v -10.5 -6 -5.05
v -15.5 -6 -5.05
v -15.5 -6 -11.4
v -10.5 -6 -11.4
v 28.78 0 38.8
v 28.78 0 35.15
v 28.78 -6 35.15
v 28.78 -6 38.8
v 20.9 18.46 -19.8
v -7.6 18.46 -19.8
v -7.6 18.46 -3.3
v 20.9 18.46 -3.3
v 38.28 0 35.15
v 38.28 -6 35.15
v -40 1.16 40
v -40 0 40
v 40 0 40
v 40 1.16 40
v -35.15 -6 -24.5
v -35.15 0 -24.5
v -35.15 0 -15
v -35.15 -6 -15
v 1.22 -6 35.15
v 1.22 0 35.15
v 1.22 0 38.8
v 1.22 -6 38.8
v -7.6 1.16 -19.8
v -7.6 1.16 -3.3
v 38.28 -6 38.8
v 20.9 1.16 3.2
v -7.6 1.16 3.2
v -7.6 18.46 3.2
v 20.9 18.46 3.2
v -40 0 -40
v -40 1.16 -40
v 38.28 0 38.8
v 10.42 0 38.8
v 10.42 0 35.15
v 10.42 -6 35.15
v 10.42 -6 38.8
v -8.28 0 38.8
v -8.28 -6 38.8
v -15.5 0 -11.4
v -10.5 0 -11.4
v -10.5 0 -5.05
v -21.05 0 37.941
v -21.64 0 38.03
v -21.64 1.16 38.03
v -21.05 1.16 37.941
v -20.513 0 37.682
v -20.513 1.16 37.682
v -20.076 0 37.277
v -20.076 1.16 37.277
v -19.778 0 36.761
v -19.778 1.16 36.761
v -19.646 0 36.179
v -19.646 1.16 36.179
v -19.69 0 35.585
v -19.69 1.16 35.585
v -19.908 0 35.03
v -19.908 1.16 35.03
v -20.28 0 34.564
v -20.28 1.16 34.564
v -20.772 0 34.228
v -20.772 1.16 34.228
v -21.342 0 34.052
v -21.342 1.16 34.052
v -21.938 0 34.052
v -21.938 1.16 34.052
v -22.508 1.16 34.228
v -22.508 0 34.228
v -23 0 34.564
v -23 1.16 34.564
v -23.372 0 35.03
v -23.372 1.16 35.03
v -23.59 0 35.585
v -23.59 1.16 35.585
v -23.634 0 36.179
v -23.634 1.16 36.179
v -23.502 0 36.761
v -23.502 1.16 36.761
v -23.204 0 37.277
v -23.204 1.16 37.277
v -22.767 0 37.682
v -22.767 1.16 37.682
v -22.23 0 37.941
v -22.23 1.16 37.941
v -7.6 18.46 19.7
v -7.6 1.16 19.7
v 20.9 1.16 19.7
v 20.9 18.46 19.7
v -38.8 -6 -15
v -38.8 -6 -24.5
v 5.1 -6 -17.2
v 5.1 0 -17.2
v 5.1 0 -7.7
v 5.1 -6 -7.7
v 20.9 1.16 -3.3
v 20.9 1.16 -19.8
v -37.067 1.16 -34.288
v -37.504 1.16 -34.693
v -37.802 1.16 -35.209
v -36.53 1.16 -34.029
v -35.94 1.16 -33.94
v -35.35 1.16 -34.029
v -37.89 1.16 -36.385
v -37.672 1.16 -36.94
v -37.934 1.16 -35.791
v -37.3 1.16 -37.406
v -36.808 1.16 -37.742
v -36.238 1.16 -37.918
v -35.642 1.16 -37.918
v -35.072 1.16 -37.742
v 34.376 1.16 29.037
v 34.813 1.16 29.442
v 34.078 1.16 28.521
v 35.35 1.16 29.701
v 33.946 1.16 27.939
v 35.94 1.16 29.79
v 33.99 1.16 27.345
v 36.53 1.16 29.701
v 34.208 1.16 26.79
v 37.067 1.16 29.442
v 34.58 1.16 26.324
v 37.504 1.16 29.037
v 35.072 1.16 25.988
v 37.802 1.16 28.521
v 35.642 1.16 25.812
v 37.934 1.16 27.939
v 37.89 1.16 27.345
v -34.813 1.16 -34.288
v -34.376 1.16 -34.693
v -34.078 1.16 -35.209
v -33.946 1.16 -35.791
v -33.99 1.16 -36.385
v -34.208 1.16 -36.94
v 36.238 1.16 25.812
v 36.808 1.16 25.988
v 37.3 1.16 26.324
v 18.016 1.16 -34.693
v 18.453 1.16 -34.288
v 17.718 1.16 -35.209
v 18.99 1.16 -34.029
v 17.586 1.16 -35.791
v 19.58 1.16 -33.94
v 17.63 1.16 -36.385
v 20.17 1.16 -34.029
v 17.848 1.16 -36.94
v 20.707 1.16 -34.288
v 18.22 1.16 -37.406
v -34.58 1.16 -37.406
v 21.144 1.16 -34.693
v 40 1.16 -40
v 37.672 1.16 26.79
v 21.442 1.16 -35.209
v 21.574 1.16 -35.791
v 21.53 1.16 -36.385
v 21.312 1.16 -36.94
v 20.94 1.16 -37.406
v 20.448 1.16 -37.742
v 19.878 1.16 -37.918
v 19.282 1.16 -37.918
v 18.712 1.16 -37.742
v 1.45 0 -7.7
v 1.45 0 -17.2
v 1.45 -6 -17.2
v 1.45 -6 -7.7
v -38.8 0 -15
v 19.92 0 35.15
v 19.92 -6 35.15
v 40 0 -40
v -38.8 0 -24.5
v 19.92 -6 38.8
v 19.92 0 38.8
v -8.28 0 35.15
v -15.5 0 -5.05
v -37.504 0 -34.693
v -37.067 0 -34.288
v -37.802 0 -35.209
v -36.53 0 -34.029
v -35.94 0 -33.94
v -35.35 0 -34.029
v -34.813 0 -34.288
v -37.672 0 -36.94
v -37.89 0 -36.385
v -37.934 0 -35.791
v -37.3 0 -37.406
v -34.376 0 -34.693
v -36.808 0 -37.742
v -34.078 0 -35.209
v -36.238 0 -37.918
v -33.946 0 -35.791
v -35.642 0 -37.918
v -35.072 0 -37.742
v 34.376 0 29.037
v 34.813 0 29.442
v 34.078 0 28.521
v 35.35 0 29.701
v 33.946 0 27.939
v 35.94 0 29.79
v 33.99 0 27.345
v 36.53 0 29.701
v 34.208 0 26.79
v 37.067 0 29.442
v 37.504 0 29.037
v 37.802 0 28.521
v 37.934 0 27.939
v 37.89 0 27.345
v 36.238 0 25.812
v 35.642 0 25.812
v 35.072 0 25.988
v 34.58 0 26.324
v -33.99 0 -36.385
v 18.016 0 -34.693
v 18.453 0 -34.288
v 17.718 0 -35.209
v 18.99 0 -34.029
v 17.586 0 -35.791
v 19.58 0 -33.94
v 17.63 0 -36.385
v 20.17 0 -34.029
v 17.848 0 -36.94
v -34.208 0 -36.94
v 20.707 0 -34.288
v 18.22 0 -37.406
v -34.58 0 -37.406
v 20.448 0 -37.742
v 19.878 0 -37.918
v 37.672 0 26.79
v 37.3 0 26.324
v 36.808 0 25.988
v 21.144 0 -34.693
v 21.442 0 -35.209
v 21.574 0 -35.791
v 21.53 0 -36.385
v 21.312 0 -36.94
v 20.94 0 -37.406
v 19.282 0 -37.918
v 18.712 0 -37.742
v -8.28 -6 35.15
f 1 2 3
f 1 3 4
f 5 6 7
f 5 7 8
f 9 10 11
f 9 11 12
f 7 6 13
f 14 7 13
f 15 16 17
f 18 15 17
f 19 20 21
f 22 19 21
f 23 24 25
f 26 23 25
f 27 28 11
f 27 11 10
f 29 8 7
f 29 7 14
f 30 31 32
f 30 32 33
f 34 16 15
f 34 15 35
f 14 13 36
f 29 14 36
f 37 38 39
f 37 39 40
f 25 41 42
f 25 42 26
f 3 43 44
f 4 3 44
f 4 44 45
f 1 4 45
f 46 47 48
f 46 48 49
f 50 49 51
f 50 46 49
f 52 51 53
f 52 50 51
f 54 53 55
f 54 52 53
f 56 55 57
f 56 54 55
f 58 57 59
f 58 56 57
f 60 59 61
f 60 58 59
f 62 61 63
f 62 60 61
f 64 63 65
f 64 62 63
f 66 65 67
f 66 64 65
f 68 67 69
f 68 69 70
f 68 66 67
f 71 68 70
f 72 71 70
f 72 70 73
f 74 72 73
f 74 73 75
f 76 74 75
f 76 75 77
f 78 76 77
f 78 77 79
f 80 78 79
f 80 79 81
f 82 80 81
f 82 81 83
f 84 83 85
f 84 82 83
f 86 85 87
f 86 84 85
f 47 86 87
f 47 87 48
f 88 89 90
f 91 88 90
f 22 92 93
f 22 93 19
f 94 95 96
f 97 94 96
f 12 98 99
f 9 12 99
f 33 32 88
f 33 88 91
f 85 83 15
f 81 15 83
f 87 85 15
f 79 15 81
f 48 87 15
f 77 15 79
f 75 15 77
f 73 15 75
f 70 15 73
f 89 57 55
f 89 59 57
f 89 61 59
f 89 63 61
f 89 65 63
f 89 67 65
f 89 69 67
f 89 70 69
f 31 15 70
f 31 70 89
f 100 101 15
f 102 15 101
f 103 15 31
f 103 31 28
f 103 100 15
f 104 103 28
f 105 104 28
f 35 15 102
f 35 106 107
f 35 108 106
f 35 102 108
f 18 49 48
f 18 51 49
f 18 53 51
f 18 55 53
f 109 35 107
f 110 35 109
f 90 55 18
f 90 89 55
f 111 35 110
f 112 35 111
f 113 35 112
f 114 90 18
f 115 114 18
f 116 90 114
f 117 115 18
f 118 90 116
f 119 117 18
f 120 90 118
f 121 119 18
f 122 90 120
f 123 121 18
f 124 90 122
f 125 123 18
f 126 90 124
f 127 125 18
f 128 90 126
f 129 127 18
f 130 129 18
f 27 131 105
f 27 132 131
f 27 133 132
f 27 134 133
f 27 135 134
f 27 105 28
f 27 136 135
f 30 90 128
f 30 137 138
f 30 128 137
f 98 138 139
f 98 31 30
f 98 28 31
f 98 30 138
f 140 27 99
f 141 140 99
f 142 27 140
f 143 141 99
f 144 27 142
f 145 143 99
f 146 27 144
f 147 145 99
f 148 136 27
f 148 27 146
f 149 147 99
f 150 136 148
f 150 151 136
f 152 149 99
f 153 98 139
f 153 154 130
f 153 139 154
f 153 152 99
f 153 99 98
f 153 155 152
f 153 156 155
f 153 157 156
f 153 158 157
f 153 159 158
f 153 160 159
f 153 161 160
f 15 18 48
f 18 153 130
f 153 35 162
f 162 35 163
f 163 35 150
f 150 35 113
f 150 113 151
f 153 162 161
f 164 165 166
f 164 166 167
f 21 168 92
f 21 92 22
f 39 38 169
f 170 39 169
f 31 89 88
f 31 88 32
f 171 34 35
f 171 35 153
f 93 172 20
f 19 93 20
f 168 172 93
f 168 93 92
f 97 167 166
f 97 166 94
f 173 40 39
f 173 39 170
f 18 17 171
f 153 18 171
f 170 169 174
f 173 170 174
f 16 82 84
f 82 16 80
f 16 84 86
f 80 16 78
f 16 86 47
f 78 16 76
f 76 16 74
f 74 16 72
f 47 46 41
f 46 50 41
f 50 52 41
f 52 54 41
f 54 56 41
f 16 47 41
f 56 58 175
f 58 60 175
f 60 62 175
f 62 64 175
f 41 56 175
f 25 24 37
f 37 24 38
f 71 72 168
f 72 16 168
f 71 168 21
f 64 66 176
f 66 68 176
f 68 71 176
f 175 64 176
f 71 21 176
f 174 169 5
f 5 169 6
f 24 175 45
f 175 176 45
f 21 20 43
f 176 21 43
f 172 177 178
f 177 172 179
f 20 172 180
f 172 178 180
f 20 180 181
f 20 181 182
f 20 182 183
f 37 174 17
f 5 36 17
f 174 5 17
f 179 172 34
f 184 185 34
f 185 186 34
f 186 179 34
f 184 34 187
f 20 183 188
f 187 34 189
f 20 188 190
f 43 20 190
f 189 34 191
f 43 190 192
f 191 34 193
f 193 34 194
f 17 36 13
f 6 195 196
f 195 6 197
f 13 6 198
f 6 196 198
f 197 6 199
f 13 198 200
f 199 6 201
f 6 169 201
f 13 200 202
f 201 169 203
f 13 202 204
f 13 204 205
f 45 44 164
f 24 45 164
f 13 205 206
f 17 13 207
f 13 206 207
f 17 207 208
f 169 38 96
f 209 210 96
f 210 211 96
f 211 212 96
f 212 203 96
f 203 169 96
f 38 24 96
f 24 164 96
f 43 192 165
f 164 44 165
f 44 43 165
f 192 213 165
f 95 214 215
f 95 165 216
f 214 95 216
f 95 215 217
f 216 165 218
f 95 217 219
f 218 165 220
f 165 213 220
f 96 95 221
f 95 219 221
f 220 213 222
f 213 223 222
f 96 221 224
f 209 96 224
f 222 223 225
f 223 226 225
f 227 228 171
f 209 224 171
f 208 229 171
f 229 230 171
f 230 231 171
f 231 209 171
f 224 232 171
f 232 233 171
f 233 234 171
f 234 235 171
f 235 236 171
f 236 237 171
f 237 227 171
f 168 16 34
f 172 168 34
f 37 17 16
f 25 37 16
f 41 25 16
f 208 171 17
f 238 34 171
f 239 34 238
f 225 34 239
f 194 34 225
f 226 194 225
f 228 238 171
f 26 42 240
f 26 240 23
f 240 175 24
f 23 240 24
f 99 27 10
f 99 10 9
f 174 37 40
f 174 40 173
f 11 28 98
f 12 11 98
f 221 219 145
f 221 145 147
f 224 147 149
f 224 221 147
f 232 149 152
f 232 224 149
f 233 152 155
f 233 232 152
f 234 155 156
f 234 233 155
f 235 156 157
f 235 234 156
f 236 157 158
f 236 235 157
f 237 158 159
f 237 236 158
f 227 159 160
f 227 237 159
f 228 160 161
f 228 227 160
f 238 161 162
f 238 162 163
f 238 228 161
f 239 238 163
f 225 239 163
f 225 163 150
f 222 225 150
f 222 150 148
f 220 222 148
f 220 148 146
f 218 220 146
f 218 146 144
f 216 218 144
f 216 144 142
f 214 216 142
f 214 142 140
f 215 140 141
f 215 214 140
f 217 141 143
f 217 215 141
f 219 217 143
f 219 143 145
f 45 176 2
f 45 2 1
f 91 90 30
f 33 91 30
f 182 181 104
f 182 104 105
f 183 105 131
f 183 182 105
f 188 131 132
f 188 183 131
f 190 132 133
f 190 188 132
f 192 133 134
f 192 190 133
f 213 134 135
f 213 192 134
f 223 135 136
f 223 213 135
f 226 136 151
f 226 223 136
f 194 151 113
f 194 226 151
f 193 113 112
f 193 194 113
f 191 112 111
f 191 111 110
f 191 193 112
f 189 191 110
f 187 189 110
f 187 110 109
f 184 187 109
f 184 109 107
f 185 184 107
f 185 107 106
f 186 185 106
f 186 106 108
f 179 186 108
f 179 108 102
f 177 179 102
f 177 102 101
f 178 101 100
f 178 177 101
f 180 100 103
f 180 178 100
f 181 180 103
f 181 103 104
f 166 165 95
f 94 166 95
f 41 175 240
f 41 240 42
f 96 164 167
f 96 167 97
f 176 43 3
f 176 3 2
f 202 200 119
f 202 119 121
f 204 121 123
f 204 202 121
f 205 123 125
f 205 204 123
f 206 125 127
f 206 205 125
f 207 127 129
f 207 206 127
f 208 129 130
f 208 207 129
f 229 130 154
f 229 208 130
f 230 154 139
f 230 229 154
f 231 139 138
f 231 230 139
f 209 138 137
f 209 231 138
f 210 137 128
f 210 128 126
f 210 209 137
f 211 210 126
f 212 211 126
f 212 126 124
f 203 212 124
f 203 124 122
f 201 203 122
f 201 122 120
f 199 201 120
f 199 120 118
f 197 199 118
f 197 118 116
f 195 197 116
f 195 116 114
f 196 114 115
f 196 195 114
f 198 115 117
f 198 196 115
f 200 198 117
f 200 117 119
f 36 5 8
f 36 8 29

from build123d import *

# Parameters (mm, degrees)
ESQUISSE1_W        = 80
ESQUISSE1_H        = 80
ESQUISSE1_R        = 2
BOSS_EXTRU_1_DEPTH = 1.16
ESQUISSE2_W        = 28.5
ESQUISSE2_H        = 16.5
BOSS_EXTRU_2_DEPTH = 17.3
ESQUISSE3_W        = 9.5
ESQUISSE3_H        = 3.65
ESQUISSE3_W_2      = 3.65
ESQUISSE3_H_2      = 9.5
ESQUISSE3_W_3      = 5
ESQUISSE3_H_3      = 6.35
BOSS_EXTRU_3_DEPTH = 6


with BuildPart() as part:
    # Esquisse1 → Boss.-Extru.1 (new body)
    with BuildSketch(Plane(origin=(0, 0, 0), x_dir=(1, 0, 0), z_dir=(0, 1, 0))):
        Rectangle(ESQUISSE1_W, ESQUISSE1_H)
        with Locations(Location((-35.94, 35.94, 0), (0, 0, 270))):
            Circle(ESQUISSE1_R, mode=Mode.SUBTRACT)
        with Locations(Location((19.58, 35.94, 0), (0, 0, 270))):
            Circle(ESQUISSE1_R, mode=Mode.SUBTRACT)
        with Locations(Location((35.94, -27.79, 0), (0, 0, 270))):
            Circle(ESQUISSE1_R, mode=Mode.SUBTRACT)
        with Locations(Location((-21.64, -36.03, 0), (0, 0, 270))):
            Circle(ESQUISSE1_R, mode=Mode.SUBTRACT)
    extrude(amount=BOSS_EXTRU_1_DEPTH)

    # Esquisse2 → Boss.-Extru.2 (add)
    with BuildSketch(Plane(origin=(0, 1.16, 0), x_dir=(1, 0, 0), z_dir=(0, 1, 0))):
        with Locations((6.65, 11.55)):
            Rectangle(ESQUISSE2_W, ESQUISSE2_H)
        with Locations((6.65, -11.45)):
            Rectangle(ESQUISSE2_W, ESQUISSE2_H)
    extrude(amount=BOSS_EXTRU_2_DEPTH)

    # Esquisse3 → Boss.-Extru.3 (add)
    with BuildSketch(Plane.XZ):
        with Locations((33.53, 36.975)):
            Rectangle(ESQUISSE3_W, ESQUISSE3_H)
        with Locations((15.17, 36.975)):
            Rectangle(ESQUISSE3_W, ESQUISSE3_H)
        with Locations((-3.53, 36.975)):
            Rectangle(ESQUISSE3_W, ESQUISSE3_H)
        with Locations((3.275, -12.45)):
            Rectangle(ESQUISSE3_W_2, ESQUISSE3_H_2)
        with Locations((-36.975, -19.75)):
            Rectangle(ESQUISSE3_W_2, ESQUISSE3_H_2)
        with Locations((-13, -8.225)):
            Rectangle(ESQUISSE3_W_3, ESQUISSE3_H_3)
    extrude(amount=BOSS_EXTRU_3_DEPTH)


solid = part.part
